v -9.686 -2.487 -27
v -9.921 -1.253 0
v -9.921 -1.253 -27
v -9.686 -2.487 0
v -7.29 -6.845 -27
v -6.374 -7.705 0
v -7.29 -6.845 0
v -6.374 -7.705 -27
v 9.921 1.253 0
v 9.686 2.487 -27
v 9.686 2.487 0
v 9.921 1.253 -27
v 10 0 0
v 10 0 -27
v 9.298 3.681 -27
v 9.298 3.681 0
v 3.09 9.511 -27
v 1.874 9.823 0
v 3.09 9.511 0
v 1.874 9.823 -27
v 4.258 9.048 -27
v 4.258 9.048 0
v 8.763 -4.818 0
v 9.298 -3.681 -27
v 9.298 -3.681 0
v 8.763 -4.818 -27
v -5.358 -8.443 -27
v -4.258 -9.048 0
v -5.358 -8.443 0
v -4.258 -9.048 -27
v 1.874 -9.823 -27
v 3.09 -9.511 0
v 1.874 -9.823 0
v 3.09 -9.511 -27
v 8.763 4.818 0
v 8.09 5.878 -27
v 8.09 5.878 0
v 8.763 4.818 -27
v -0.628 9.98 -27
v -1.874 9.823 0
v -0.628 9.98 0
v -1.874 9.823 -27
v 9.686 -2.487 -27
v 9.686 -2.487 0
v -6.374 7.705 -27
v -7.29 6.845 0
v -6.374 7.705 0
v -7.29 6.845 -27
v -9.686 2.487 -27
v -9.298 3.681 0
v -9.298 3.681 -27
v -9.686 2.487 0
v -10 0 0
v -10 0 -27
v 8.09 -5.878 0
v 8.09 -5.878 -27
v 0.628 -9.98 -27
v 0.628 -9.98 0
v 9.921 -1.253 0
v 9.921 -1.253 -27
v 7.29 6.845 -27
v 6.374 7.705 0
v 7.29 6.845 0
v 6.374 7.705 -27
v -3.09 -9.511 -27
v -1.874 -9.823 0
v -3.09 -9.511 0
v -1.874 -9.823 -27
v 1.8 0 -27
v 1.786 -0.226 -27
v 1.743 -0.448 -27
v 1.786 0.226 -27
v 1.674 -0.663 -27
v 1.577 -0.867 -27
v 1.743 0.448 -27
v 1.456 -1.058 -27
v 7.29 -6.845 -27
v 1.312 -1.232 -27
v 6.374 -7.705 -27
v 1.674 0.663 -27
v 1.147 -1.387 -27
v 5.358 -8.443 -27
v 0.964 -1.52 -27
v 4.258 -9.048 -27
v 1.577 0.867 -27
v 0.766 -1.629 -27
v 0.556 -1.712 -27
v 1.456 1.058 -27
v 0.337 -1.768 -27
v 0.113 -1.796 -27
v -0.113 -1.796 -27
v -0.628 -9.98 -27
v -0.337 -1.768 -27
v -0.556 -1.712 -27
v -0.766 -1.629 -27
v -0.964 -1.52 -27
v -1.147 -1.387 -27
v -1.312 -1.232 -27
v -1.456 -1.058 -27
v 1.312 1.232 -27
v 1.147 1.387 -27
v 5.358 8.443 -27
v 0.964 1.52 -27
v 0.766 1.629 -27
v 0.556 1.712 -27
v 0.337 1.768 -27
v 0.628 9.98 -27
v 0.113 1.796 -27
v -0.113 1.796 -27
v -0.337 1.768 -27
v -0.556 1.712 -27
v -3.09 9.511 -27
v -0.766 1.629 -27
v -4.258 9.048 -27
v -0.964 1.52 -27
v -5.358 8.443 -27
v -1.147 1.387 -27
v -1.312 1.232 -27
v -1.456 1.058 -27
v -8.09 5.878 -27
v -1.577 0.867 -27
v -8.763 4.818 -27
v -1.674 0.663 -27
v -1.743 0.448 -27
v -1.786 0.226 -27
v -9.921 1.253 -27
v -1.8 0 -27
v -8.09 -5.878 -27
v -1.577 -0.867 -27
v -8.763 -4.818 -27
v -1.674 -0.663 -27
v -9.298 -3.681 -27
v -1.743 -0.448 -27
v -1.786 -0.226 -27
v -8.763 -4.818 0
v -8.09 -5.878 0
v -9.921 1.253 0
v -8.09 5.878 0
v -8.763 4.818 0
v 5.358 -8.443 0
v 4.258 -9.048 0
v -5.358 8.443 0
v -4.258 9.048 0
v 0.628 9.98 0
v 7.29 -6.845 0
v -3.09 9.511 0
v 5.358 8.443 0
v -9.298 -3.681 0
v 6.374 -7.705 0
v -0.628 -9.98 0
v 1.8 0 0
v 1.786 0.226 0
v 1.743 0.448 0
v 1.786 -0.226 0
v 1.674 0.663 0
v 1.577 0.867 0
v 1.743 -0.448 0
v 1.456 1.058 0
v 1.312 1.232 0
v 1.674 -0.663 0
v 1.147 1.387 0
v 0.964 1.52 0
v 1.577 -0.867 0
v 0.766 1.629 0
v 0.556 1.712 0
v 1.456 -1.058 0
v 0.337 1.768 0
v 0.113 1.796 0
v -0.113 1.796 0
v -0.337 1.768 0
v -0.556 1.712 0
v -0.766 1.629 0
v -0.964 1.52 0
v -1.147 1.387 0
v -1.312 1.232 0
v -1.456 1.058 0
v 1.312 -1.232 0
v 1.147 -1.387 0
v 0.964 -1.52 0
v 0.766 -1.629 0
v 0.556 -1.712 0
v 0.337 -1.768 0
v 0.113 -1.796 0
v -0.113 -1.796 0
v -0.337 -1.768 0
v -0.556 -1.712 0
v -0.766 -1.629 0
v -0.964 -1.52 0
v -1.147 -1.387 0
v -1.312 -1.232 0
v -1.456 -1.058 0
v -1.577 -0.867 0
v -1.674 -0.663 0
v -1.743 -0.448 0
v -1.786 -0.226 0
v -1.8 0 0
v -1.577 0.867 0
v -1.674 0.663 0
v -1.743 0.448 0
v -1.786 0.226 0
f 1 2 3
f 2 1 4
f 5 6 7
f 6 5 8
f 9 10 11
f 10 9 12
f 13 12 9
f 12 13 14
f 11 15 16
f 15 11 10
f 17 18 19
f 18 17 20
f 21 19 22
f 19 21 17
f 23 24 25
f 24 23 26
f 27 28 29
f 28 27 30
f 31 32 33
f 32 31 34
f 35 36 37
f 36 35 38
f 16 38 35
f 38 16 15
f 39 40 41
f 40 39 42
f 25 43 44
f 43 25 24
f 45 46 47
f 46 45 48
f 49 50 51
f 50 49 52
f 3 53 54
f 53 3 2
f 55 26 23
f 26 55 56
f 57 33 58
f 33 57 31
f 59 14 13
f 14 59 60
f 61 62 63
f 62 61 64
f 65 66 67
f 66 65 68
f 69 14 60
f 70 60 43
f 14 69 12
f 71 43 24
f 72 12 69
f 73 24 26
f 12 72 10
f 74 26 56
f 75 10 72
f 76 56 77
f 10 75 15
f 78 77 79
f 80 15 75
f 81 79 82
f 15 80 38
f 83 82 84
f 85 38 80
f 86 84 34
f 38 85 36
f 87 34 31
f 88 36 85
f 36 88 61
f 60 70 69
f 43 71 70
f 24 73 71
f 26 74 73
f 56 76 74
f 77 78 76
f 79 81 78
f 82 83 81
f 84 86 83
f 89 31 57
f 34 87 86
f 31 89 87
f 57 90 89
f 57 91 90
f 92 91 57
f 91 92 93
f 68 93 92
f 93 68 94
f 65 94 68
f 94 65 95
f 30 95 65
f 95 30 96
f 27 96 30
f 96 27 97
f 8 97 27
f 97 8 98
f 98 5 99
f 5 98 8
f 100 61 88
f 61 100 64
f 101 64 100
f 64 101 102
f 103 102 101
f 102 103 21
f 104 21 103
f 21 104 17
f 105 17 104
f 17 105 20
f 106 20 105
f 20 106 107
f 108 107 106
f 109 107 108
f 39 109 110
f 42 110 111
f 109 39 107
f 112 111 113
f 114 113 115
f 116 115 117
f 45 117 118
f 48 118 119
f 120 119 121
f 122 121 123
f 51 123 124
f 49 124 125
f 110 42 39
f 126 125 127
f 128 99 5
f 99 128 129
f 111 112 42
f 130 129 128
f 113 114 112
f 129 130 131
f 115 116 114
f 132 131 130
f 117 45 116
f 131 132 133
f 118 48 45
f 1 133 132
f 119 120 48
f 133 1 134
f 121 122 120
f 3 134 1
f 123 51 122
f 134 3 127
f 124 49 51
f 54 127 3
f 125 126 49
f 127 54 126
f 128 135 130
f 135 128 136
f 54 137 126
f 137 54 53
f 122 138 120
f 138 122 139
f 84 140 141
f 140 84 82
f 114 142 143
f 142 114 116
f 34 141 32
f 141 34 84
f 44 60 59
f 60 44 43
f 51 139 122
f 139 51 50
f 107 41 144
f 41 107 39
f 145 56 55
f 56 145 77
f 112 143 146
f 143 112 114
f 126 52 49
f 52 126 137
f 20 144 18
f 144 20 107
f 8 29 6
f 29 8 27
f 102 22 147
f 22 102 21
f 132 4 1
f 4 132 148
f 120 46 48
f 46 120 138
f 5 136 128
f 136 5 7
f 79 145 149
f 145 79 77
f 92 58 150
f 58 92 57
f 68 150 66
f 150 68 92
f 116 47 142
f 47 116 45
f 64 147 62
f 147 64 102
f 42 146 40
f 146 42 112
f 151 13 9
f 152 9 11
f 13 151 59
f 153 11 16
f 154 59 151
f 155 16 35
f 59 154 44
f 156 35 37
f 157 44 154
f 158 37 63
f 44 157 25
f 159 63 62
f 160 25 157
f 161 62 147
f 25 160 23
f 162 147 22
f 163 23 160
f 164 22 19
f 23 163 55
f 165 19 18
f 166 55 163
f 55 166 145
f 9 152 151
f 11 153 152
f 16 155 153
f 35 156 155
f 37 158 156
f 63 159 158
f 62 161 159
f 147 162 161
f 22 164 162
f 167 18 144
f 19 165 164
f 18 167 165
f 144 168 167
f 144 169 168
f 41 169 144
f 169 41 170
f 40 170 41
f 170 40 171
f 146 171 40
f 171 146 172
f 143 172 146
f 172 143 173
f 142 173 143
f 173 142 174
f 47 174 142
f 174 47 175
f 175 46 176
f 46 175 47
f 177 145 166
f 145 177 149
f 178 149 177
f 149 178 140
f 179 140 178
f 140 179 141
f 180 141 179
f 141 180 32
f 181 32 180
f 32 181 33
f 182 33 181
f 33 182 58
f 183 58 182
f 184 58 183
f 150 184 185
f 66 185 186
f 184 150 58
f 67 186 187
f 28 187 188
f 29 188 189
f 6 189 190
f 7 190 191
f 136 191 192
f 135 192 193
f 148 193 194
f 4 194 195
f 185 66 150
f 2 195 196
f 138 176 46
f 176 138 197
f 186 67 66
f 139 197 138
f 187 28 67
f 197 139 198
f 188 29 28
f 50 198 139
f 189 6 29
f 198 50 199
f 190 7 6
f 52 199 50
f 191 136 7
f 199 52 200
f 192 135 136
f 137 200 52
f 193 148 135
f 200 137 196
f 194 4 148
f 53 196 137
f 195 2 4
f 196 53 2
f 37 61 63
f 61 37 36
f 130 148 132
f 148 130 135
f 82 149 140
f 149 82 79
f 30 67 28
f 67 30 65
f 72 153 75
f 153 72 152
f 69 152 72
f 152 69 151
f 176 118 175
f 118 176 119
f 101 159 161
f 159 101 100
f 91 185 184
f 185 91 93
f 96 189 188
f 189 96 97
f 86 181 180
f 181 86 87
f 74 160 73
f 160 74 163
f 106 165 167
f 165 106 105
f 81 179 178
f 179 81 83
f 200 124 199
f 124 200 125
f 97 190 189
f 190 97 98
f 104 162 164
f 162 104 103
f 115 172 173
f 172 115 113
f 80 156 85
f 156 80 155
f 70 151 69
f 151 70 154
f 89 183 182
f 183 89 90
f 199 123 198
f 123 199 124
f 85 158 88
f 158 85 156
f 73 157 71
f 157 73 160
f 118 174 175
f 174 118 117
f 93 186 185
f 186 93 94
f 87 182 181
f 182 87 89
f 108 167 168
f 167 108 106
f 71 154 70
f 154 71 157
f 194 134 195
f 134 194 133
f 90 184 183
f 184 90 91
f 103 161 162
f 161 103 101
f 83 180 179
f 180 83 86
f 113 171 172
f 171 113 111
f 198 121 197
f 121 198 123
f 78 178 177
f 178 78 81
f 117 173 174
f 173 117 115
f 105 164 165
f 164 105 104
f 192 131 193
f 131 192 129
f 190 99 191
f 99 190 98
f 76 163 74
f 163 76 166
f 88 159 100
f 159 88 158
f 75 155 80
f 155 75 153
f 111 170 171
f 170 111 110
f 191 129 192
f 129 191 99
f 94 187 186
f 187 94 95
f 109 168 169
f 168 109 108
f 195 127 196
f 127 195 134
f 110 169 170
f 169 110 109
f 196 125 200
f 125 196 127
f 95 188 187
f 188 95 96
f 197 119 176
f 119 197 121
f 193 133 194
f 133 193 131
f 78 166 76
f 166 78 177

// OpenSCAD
$fn = 50;


difference() {
	union() {
		translate(v = [0, 0, -27.0000000000]) {
			cylinder(h = 27, r = 10.0000000000);
		}
		cylinder(h = 0, r = 20.0000000000);
	}
	union() {
		#translate(v = [0, 0, -27]) {
			cylinder(h = 27, r = 1.8000000000);
		}
	}
}
